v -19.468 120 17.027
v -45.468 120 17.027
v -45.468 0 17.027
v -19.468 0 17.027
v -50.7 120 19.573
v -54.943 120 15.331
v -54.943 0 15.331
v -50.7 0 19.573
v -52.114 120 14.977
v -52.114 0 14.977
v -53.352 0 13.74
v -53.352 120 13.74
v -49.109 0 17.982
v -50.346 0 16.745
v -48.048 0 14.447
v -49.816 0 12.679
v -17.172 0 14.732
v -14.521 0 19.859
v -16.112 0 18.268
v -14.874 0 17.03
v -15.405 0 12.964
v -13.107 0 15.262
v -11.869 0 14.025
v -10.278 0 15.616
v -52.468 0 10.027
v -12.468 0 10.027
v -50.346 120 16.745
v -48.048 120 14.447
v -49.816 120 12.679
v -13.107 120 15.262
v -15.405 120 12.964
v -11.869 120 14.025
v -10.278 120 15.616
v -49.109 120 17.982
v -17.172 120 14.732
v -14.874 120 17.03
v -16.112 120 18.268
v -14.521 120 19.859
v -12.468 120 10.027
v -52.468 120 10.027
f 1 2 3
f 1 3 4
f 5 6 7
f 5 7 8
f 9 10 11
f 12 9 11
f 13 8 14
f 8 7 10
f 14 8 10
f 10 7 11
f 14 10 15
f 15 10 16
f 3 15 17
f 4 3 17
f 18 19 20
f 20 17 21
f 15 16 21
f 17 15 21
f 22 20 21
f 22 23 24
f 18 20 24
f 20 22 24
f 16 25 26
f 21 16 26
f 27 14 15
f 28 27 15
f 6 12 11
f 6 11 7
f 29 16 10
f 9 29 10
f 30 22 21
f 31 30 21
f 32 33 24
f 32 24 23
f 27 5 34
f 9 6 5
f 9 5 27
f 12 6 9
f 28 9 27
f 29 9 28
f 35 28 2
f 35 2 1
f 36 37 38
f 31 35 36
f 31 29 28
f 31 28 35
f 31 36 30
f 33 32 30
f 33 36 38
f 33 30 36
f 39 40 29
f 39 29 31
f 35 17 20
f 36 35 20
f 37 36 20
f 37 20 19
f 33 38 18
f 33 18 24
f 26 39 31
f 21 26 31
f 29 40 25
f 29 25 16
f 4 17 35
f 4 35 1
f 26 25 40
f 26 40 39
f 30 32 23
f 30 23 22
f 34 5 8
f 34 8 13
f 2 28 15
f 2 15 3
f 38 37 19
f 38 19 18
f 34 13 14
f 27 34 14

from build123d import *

# Parameters (mm, degrees)
SKETCH1_W           = 40
SKETCH1_H           = 7
BOSS_EXTRUDE3_DEPTH = 120
CUT_EXTRUDE3_DEPTH  = 120
CUT_EXTRUDE4_DEPTH  = 120
BOSS_EXTRUDE4_DEPTH = 120
BOSS_EXTRUDE5_DEPTH = 120


with BuildPart() as part:
    # Sketch1 → Boss-Extrude3 (new body)
    with BuildSketch(Plane(origin=(0, 0, 0), x_dir=(1, 0, 0), z_dir=(0, 1, 0))):
        with Locations((-32.467727981, -13.5274909)):
            Rectangle(SKETCH1_W, SKETCH1_H)
    extrude(amount=BOSS_EXTRUDE3_DEPTH)

    # Sketch6 → Cut-Extrude3 (cut)
    with BuildSketch(Plane(origin=(0, 120, 0), x_dir=(1, 0, 0), z_dir=(0, 1, 0))):
        Polygon((-52.467727981, -17.0274909), (-52.467727981, -10.0274909), (-45.467727981, -17.0274909), align=None)
    extrude(amount=-CUT_EXTRUDE3_DEPTH, mode=Mode.SUBTRACT)

    # Sketch7 → Cut-Extrude4 (cut)
    with BuildSketch(Plane(origin=(0, 120, 0), x_dir=(1, 0, 0), z_dir=(0, 1, 0))):
        Polygon((-12.467727981, -17.0274909), (-12.467727981, -10.0274909), (-19.467727981, -17.0274909), align=None)
    extrude(amount=-CUT_EXTRUDE4_DEPTH, mode=Mode.SUBTRACT)

    # Sketch8 → Boss-Extrude4 (add)
    with BuildSketch(Plane(origin=(0, 120, 0), x_dir=(1, 0, 0), z_dir=(0, 1, 0))):
        Polygon((-49.816077551, -12.679141329), (-52.11417459, -14.977238368), (-53.351611457, -13.739801501), (-54.942601715, -15.330791759), (-50.699961028, -19.573432446), (-49.10897077, -17.982442188), (-50.346407637, -16.745005321), (-48.048310598, -14.446908282), align=None)
    extrude(amount=-BOSS_EXTRUDE4_DEPTH)

    # Sketch9 → Boss-Extrude5 (add)
    with BuildSketch(Plane(origin=(0, 120, 0), x_dir=(1, 0, 0), z_dir=(0, 1, 0))):
        Polygon((-17.172372993, -14.732135912), (-14.874275954, -17.030232951), (-16.111712821, -18.267669818), (-14.520722564, -19.858660076), (-10.278081876, -15.616019388), (-11.869072134, -14.025029131), (-13.106509001, -15.262465998), (-15.40460604, -12.964368959), align=None)
    extrude(amount=-BOSS_EXTRUDE5_DEPTH)


solid = part.part
